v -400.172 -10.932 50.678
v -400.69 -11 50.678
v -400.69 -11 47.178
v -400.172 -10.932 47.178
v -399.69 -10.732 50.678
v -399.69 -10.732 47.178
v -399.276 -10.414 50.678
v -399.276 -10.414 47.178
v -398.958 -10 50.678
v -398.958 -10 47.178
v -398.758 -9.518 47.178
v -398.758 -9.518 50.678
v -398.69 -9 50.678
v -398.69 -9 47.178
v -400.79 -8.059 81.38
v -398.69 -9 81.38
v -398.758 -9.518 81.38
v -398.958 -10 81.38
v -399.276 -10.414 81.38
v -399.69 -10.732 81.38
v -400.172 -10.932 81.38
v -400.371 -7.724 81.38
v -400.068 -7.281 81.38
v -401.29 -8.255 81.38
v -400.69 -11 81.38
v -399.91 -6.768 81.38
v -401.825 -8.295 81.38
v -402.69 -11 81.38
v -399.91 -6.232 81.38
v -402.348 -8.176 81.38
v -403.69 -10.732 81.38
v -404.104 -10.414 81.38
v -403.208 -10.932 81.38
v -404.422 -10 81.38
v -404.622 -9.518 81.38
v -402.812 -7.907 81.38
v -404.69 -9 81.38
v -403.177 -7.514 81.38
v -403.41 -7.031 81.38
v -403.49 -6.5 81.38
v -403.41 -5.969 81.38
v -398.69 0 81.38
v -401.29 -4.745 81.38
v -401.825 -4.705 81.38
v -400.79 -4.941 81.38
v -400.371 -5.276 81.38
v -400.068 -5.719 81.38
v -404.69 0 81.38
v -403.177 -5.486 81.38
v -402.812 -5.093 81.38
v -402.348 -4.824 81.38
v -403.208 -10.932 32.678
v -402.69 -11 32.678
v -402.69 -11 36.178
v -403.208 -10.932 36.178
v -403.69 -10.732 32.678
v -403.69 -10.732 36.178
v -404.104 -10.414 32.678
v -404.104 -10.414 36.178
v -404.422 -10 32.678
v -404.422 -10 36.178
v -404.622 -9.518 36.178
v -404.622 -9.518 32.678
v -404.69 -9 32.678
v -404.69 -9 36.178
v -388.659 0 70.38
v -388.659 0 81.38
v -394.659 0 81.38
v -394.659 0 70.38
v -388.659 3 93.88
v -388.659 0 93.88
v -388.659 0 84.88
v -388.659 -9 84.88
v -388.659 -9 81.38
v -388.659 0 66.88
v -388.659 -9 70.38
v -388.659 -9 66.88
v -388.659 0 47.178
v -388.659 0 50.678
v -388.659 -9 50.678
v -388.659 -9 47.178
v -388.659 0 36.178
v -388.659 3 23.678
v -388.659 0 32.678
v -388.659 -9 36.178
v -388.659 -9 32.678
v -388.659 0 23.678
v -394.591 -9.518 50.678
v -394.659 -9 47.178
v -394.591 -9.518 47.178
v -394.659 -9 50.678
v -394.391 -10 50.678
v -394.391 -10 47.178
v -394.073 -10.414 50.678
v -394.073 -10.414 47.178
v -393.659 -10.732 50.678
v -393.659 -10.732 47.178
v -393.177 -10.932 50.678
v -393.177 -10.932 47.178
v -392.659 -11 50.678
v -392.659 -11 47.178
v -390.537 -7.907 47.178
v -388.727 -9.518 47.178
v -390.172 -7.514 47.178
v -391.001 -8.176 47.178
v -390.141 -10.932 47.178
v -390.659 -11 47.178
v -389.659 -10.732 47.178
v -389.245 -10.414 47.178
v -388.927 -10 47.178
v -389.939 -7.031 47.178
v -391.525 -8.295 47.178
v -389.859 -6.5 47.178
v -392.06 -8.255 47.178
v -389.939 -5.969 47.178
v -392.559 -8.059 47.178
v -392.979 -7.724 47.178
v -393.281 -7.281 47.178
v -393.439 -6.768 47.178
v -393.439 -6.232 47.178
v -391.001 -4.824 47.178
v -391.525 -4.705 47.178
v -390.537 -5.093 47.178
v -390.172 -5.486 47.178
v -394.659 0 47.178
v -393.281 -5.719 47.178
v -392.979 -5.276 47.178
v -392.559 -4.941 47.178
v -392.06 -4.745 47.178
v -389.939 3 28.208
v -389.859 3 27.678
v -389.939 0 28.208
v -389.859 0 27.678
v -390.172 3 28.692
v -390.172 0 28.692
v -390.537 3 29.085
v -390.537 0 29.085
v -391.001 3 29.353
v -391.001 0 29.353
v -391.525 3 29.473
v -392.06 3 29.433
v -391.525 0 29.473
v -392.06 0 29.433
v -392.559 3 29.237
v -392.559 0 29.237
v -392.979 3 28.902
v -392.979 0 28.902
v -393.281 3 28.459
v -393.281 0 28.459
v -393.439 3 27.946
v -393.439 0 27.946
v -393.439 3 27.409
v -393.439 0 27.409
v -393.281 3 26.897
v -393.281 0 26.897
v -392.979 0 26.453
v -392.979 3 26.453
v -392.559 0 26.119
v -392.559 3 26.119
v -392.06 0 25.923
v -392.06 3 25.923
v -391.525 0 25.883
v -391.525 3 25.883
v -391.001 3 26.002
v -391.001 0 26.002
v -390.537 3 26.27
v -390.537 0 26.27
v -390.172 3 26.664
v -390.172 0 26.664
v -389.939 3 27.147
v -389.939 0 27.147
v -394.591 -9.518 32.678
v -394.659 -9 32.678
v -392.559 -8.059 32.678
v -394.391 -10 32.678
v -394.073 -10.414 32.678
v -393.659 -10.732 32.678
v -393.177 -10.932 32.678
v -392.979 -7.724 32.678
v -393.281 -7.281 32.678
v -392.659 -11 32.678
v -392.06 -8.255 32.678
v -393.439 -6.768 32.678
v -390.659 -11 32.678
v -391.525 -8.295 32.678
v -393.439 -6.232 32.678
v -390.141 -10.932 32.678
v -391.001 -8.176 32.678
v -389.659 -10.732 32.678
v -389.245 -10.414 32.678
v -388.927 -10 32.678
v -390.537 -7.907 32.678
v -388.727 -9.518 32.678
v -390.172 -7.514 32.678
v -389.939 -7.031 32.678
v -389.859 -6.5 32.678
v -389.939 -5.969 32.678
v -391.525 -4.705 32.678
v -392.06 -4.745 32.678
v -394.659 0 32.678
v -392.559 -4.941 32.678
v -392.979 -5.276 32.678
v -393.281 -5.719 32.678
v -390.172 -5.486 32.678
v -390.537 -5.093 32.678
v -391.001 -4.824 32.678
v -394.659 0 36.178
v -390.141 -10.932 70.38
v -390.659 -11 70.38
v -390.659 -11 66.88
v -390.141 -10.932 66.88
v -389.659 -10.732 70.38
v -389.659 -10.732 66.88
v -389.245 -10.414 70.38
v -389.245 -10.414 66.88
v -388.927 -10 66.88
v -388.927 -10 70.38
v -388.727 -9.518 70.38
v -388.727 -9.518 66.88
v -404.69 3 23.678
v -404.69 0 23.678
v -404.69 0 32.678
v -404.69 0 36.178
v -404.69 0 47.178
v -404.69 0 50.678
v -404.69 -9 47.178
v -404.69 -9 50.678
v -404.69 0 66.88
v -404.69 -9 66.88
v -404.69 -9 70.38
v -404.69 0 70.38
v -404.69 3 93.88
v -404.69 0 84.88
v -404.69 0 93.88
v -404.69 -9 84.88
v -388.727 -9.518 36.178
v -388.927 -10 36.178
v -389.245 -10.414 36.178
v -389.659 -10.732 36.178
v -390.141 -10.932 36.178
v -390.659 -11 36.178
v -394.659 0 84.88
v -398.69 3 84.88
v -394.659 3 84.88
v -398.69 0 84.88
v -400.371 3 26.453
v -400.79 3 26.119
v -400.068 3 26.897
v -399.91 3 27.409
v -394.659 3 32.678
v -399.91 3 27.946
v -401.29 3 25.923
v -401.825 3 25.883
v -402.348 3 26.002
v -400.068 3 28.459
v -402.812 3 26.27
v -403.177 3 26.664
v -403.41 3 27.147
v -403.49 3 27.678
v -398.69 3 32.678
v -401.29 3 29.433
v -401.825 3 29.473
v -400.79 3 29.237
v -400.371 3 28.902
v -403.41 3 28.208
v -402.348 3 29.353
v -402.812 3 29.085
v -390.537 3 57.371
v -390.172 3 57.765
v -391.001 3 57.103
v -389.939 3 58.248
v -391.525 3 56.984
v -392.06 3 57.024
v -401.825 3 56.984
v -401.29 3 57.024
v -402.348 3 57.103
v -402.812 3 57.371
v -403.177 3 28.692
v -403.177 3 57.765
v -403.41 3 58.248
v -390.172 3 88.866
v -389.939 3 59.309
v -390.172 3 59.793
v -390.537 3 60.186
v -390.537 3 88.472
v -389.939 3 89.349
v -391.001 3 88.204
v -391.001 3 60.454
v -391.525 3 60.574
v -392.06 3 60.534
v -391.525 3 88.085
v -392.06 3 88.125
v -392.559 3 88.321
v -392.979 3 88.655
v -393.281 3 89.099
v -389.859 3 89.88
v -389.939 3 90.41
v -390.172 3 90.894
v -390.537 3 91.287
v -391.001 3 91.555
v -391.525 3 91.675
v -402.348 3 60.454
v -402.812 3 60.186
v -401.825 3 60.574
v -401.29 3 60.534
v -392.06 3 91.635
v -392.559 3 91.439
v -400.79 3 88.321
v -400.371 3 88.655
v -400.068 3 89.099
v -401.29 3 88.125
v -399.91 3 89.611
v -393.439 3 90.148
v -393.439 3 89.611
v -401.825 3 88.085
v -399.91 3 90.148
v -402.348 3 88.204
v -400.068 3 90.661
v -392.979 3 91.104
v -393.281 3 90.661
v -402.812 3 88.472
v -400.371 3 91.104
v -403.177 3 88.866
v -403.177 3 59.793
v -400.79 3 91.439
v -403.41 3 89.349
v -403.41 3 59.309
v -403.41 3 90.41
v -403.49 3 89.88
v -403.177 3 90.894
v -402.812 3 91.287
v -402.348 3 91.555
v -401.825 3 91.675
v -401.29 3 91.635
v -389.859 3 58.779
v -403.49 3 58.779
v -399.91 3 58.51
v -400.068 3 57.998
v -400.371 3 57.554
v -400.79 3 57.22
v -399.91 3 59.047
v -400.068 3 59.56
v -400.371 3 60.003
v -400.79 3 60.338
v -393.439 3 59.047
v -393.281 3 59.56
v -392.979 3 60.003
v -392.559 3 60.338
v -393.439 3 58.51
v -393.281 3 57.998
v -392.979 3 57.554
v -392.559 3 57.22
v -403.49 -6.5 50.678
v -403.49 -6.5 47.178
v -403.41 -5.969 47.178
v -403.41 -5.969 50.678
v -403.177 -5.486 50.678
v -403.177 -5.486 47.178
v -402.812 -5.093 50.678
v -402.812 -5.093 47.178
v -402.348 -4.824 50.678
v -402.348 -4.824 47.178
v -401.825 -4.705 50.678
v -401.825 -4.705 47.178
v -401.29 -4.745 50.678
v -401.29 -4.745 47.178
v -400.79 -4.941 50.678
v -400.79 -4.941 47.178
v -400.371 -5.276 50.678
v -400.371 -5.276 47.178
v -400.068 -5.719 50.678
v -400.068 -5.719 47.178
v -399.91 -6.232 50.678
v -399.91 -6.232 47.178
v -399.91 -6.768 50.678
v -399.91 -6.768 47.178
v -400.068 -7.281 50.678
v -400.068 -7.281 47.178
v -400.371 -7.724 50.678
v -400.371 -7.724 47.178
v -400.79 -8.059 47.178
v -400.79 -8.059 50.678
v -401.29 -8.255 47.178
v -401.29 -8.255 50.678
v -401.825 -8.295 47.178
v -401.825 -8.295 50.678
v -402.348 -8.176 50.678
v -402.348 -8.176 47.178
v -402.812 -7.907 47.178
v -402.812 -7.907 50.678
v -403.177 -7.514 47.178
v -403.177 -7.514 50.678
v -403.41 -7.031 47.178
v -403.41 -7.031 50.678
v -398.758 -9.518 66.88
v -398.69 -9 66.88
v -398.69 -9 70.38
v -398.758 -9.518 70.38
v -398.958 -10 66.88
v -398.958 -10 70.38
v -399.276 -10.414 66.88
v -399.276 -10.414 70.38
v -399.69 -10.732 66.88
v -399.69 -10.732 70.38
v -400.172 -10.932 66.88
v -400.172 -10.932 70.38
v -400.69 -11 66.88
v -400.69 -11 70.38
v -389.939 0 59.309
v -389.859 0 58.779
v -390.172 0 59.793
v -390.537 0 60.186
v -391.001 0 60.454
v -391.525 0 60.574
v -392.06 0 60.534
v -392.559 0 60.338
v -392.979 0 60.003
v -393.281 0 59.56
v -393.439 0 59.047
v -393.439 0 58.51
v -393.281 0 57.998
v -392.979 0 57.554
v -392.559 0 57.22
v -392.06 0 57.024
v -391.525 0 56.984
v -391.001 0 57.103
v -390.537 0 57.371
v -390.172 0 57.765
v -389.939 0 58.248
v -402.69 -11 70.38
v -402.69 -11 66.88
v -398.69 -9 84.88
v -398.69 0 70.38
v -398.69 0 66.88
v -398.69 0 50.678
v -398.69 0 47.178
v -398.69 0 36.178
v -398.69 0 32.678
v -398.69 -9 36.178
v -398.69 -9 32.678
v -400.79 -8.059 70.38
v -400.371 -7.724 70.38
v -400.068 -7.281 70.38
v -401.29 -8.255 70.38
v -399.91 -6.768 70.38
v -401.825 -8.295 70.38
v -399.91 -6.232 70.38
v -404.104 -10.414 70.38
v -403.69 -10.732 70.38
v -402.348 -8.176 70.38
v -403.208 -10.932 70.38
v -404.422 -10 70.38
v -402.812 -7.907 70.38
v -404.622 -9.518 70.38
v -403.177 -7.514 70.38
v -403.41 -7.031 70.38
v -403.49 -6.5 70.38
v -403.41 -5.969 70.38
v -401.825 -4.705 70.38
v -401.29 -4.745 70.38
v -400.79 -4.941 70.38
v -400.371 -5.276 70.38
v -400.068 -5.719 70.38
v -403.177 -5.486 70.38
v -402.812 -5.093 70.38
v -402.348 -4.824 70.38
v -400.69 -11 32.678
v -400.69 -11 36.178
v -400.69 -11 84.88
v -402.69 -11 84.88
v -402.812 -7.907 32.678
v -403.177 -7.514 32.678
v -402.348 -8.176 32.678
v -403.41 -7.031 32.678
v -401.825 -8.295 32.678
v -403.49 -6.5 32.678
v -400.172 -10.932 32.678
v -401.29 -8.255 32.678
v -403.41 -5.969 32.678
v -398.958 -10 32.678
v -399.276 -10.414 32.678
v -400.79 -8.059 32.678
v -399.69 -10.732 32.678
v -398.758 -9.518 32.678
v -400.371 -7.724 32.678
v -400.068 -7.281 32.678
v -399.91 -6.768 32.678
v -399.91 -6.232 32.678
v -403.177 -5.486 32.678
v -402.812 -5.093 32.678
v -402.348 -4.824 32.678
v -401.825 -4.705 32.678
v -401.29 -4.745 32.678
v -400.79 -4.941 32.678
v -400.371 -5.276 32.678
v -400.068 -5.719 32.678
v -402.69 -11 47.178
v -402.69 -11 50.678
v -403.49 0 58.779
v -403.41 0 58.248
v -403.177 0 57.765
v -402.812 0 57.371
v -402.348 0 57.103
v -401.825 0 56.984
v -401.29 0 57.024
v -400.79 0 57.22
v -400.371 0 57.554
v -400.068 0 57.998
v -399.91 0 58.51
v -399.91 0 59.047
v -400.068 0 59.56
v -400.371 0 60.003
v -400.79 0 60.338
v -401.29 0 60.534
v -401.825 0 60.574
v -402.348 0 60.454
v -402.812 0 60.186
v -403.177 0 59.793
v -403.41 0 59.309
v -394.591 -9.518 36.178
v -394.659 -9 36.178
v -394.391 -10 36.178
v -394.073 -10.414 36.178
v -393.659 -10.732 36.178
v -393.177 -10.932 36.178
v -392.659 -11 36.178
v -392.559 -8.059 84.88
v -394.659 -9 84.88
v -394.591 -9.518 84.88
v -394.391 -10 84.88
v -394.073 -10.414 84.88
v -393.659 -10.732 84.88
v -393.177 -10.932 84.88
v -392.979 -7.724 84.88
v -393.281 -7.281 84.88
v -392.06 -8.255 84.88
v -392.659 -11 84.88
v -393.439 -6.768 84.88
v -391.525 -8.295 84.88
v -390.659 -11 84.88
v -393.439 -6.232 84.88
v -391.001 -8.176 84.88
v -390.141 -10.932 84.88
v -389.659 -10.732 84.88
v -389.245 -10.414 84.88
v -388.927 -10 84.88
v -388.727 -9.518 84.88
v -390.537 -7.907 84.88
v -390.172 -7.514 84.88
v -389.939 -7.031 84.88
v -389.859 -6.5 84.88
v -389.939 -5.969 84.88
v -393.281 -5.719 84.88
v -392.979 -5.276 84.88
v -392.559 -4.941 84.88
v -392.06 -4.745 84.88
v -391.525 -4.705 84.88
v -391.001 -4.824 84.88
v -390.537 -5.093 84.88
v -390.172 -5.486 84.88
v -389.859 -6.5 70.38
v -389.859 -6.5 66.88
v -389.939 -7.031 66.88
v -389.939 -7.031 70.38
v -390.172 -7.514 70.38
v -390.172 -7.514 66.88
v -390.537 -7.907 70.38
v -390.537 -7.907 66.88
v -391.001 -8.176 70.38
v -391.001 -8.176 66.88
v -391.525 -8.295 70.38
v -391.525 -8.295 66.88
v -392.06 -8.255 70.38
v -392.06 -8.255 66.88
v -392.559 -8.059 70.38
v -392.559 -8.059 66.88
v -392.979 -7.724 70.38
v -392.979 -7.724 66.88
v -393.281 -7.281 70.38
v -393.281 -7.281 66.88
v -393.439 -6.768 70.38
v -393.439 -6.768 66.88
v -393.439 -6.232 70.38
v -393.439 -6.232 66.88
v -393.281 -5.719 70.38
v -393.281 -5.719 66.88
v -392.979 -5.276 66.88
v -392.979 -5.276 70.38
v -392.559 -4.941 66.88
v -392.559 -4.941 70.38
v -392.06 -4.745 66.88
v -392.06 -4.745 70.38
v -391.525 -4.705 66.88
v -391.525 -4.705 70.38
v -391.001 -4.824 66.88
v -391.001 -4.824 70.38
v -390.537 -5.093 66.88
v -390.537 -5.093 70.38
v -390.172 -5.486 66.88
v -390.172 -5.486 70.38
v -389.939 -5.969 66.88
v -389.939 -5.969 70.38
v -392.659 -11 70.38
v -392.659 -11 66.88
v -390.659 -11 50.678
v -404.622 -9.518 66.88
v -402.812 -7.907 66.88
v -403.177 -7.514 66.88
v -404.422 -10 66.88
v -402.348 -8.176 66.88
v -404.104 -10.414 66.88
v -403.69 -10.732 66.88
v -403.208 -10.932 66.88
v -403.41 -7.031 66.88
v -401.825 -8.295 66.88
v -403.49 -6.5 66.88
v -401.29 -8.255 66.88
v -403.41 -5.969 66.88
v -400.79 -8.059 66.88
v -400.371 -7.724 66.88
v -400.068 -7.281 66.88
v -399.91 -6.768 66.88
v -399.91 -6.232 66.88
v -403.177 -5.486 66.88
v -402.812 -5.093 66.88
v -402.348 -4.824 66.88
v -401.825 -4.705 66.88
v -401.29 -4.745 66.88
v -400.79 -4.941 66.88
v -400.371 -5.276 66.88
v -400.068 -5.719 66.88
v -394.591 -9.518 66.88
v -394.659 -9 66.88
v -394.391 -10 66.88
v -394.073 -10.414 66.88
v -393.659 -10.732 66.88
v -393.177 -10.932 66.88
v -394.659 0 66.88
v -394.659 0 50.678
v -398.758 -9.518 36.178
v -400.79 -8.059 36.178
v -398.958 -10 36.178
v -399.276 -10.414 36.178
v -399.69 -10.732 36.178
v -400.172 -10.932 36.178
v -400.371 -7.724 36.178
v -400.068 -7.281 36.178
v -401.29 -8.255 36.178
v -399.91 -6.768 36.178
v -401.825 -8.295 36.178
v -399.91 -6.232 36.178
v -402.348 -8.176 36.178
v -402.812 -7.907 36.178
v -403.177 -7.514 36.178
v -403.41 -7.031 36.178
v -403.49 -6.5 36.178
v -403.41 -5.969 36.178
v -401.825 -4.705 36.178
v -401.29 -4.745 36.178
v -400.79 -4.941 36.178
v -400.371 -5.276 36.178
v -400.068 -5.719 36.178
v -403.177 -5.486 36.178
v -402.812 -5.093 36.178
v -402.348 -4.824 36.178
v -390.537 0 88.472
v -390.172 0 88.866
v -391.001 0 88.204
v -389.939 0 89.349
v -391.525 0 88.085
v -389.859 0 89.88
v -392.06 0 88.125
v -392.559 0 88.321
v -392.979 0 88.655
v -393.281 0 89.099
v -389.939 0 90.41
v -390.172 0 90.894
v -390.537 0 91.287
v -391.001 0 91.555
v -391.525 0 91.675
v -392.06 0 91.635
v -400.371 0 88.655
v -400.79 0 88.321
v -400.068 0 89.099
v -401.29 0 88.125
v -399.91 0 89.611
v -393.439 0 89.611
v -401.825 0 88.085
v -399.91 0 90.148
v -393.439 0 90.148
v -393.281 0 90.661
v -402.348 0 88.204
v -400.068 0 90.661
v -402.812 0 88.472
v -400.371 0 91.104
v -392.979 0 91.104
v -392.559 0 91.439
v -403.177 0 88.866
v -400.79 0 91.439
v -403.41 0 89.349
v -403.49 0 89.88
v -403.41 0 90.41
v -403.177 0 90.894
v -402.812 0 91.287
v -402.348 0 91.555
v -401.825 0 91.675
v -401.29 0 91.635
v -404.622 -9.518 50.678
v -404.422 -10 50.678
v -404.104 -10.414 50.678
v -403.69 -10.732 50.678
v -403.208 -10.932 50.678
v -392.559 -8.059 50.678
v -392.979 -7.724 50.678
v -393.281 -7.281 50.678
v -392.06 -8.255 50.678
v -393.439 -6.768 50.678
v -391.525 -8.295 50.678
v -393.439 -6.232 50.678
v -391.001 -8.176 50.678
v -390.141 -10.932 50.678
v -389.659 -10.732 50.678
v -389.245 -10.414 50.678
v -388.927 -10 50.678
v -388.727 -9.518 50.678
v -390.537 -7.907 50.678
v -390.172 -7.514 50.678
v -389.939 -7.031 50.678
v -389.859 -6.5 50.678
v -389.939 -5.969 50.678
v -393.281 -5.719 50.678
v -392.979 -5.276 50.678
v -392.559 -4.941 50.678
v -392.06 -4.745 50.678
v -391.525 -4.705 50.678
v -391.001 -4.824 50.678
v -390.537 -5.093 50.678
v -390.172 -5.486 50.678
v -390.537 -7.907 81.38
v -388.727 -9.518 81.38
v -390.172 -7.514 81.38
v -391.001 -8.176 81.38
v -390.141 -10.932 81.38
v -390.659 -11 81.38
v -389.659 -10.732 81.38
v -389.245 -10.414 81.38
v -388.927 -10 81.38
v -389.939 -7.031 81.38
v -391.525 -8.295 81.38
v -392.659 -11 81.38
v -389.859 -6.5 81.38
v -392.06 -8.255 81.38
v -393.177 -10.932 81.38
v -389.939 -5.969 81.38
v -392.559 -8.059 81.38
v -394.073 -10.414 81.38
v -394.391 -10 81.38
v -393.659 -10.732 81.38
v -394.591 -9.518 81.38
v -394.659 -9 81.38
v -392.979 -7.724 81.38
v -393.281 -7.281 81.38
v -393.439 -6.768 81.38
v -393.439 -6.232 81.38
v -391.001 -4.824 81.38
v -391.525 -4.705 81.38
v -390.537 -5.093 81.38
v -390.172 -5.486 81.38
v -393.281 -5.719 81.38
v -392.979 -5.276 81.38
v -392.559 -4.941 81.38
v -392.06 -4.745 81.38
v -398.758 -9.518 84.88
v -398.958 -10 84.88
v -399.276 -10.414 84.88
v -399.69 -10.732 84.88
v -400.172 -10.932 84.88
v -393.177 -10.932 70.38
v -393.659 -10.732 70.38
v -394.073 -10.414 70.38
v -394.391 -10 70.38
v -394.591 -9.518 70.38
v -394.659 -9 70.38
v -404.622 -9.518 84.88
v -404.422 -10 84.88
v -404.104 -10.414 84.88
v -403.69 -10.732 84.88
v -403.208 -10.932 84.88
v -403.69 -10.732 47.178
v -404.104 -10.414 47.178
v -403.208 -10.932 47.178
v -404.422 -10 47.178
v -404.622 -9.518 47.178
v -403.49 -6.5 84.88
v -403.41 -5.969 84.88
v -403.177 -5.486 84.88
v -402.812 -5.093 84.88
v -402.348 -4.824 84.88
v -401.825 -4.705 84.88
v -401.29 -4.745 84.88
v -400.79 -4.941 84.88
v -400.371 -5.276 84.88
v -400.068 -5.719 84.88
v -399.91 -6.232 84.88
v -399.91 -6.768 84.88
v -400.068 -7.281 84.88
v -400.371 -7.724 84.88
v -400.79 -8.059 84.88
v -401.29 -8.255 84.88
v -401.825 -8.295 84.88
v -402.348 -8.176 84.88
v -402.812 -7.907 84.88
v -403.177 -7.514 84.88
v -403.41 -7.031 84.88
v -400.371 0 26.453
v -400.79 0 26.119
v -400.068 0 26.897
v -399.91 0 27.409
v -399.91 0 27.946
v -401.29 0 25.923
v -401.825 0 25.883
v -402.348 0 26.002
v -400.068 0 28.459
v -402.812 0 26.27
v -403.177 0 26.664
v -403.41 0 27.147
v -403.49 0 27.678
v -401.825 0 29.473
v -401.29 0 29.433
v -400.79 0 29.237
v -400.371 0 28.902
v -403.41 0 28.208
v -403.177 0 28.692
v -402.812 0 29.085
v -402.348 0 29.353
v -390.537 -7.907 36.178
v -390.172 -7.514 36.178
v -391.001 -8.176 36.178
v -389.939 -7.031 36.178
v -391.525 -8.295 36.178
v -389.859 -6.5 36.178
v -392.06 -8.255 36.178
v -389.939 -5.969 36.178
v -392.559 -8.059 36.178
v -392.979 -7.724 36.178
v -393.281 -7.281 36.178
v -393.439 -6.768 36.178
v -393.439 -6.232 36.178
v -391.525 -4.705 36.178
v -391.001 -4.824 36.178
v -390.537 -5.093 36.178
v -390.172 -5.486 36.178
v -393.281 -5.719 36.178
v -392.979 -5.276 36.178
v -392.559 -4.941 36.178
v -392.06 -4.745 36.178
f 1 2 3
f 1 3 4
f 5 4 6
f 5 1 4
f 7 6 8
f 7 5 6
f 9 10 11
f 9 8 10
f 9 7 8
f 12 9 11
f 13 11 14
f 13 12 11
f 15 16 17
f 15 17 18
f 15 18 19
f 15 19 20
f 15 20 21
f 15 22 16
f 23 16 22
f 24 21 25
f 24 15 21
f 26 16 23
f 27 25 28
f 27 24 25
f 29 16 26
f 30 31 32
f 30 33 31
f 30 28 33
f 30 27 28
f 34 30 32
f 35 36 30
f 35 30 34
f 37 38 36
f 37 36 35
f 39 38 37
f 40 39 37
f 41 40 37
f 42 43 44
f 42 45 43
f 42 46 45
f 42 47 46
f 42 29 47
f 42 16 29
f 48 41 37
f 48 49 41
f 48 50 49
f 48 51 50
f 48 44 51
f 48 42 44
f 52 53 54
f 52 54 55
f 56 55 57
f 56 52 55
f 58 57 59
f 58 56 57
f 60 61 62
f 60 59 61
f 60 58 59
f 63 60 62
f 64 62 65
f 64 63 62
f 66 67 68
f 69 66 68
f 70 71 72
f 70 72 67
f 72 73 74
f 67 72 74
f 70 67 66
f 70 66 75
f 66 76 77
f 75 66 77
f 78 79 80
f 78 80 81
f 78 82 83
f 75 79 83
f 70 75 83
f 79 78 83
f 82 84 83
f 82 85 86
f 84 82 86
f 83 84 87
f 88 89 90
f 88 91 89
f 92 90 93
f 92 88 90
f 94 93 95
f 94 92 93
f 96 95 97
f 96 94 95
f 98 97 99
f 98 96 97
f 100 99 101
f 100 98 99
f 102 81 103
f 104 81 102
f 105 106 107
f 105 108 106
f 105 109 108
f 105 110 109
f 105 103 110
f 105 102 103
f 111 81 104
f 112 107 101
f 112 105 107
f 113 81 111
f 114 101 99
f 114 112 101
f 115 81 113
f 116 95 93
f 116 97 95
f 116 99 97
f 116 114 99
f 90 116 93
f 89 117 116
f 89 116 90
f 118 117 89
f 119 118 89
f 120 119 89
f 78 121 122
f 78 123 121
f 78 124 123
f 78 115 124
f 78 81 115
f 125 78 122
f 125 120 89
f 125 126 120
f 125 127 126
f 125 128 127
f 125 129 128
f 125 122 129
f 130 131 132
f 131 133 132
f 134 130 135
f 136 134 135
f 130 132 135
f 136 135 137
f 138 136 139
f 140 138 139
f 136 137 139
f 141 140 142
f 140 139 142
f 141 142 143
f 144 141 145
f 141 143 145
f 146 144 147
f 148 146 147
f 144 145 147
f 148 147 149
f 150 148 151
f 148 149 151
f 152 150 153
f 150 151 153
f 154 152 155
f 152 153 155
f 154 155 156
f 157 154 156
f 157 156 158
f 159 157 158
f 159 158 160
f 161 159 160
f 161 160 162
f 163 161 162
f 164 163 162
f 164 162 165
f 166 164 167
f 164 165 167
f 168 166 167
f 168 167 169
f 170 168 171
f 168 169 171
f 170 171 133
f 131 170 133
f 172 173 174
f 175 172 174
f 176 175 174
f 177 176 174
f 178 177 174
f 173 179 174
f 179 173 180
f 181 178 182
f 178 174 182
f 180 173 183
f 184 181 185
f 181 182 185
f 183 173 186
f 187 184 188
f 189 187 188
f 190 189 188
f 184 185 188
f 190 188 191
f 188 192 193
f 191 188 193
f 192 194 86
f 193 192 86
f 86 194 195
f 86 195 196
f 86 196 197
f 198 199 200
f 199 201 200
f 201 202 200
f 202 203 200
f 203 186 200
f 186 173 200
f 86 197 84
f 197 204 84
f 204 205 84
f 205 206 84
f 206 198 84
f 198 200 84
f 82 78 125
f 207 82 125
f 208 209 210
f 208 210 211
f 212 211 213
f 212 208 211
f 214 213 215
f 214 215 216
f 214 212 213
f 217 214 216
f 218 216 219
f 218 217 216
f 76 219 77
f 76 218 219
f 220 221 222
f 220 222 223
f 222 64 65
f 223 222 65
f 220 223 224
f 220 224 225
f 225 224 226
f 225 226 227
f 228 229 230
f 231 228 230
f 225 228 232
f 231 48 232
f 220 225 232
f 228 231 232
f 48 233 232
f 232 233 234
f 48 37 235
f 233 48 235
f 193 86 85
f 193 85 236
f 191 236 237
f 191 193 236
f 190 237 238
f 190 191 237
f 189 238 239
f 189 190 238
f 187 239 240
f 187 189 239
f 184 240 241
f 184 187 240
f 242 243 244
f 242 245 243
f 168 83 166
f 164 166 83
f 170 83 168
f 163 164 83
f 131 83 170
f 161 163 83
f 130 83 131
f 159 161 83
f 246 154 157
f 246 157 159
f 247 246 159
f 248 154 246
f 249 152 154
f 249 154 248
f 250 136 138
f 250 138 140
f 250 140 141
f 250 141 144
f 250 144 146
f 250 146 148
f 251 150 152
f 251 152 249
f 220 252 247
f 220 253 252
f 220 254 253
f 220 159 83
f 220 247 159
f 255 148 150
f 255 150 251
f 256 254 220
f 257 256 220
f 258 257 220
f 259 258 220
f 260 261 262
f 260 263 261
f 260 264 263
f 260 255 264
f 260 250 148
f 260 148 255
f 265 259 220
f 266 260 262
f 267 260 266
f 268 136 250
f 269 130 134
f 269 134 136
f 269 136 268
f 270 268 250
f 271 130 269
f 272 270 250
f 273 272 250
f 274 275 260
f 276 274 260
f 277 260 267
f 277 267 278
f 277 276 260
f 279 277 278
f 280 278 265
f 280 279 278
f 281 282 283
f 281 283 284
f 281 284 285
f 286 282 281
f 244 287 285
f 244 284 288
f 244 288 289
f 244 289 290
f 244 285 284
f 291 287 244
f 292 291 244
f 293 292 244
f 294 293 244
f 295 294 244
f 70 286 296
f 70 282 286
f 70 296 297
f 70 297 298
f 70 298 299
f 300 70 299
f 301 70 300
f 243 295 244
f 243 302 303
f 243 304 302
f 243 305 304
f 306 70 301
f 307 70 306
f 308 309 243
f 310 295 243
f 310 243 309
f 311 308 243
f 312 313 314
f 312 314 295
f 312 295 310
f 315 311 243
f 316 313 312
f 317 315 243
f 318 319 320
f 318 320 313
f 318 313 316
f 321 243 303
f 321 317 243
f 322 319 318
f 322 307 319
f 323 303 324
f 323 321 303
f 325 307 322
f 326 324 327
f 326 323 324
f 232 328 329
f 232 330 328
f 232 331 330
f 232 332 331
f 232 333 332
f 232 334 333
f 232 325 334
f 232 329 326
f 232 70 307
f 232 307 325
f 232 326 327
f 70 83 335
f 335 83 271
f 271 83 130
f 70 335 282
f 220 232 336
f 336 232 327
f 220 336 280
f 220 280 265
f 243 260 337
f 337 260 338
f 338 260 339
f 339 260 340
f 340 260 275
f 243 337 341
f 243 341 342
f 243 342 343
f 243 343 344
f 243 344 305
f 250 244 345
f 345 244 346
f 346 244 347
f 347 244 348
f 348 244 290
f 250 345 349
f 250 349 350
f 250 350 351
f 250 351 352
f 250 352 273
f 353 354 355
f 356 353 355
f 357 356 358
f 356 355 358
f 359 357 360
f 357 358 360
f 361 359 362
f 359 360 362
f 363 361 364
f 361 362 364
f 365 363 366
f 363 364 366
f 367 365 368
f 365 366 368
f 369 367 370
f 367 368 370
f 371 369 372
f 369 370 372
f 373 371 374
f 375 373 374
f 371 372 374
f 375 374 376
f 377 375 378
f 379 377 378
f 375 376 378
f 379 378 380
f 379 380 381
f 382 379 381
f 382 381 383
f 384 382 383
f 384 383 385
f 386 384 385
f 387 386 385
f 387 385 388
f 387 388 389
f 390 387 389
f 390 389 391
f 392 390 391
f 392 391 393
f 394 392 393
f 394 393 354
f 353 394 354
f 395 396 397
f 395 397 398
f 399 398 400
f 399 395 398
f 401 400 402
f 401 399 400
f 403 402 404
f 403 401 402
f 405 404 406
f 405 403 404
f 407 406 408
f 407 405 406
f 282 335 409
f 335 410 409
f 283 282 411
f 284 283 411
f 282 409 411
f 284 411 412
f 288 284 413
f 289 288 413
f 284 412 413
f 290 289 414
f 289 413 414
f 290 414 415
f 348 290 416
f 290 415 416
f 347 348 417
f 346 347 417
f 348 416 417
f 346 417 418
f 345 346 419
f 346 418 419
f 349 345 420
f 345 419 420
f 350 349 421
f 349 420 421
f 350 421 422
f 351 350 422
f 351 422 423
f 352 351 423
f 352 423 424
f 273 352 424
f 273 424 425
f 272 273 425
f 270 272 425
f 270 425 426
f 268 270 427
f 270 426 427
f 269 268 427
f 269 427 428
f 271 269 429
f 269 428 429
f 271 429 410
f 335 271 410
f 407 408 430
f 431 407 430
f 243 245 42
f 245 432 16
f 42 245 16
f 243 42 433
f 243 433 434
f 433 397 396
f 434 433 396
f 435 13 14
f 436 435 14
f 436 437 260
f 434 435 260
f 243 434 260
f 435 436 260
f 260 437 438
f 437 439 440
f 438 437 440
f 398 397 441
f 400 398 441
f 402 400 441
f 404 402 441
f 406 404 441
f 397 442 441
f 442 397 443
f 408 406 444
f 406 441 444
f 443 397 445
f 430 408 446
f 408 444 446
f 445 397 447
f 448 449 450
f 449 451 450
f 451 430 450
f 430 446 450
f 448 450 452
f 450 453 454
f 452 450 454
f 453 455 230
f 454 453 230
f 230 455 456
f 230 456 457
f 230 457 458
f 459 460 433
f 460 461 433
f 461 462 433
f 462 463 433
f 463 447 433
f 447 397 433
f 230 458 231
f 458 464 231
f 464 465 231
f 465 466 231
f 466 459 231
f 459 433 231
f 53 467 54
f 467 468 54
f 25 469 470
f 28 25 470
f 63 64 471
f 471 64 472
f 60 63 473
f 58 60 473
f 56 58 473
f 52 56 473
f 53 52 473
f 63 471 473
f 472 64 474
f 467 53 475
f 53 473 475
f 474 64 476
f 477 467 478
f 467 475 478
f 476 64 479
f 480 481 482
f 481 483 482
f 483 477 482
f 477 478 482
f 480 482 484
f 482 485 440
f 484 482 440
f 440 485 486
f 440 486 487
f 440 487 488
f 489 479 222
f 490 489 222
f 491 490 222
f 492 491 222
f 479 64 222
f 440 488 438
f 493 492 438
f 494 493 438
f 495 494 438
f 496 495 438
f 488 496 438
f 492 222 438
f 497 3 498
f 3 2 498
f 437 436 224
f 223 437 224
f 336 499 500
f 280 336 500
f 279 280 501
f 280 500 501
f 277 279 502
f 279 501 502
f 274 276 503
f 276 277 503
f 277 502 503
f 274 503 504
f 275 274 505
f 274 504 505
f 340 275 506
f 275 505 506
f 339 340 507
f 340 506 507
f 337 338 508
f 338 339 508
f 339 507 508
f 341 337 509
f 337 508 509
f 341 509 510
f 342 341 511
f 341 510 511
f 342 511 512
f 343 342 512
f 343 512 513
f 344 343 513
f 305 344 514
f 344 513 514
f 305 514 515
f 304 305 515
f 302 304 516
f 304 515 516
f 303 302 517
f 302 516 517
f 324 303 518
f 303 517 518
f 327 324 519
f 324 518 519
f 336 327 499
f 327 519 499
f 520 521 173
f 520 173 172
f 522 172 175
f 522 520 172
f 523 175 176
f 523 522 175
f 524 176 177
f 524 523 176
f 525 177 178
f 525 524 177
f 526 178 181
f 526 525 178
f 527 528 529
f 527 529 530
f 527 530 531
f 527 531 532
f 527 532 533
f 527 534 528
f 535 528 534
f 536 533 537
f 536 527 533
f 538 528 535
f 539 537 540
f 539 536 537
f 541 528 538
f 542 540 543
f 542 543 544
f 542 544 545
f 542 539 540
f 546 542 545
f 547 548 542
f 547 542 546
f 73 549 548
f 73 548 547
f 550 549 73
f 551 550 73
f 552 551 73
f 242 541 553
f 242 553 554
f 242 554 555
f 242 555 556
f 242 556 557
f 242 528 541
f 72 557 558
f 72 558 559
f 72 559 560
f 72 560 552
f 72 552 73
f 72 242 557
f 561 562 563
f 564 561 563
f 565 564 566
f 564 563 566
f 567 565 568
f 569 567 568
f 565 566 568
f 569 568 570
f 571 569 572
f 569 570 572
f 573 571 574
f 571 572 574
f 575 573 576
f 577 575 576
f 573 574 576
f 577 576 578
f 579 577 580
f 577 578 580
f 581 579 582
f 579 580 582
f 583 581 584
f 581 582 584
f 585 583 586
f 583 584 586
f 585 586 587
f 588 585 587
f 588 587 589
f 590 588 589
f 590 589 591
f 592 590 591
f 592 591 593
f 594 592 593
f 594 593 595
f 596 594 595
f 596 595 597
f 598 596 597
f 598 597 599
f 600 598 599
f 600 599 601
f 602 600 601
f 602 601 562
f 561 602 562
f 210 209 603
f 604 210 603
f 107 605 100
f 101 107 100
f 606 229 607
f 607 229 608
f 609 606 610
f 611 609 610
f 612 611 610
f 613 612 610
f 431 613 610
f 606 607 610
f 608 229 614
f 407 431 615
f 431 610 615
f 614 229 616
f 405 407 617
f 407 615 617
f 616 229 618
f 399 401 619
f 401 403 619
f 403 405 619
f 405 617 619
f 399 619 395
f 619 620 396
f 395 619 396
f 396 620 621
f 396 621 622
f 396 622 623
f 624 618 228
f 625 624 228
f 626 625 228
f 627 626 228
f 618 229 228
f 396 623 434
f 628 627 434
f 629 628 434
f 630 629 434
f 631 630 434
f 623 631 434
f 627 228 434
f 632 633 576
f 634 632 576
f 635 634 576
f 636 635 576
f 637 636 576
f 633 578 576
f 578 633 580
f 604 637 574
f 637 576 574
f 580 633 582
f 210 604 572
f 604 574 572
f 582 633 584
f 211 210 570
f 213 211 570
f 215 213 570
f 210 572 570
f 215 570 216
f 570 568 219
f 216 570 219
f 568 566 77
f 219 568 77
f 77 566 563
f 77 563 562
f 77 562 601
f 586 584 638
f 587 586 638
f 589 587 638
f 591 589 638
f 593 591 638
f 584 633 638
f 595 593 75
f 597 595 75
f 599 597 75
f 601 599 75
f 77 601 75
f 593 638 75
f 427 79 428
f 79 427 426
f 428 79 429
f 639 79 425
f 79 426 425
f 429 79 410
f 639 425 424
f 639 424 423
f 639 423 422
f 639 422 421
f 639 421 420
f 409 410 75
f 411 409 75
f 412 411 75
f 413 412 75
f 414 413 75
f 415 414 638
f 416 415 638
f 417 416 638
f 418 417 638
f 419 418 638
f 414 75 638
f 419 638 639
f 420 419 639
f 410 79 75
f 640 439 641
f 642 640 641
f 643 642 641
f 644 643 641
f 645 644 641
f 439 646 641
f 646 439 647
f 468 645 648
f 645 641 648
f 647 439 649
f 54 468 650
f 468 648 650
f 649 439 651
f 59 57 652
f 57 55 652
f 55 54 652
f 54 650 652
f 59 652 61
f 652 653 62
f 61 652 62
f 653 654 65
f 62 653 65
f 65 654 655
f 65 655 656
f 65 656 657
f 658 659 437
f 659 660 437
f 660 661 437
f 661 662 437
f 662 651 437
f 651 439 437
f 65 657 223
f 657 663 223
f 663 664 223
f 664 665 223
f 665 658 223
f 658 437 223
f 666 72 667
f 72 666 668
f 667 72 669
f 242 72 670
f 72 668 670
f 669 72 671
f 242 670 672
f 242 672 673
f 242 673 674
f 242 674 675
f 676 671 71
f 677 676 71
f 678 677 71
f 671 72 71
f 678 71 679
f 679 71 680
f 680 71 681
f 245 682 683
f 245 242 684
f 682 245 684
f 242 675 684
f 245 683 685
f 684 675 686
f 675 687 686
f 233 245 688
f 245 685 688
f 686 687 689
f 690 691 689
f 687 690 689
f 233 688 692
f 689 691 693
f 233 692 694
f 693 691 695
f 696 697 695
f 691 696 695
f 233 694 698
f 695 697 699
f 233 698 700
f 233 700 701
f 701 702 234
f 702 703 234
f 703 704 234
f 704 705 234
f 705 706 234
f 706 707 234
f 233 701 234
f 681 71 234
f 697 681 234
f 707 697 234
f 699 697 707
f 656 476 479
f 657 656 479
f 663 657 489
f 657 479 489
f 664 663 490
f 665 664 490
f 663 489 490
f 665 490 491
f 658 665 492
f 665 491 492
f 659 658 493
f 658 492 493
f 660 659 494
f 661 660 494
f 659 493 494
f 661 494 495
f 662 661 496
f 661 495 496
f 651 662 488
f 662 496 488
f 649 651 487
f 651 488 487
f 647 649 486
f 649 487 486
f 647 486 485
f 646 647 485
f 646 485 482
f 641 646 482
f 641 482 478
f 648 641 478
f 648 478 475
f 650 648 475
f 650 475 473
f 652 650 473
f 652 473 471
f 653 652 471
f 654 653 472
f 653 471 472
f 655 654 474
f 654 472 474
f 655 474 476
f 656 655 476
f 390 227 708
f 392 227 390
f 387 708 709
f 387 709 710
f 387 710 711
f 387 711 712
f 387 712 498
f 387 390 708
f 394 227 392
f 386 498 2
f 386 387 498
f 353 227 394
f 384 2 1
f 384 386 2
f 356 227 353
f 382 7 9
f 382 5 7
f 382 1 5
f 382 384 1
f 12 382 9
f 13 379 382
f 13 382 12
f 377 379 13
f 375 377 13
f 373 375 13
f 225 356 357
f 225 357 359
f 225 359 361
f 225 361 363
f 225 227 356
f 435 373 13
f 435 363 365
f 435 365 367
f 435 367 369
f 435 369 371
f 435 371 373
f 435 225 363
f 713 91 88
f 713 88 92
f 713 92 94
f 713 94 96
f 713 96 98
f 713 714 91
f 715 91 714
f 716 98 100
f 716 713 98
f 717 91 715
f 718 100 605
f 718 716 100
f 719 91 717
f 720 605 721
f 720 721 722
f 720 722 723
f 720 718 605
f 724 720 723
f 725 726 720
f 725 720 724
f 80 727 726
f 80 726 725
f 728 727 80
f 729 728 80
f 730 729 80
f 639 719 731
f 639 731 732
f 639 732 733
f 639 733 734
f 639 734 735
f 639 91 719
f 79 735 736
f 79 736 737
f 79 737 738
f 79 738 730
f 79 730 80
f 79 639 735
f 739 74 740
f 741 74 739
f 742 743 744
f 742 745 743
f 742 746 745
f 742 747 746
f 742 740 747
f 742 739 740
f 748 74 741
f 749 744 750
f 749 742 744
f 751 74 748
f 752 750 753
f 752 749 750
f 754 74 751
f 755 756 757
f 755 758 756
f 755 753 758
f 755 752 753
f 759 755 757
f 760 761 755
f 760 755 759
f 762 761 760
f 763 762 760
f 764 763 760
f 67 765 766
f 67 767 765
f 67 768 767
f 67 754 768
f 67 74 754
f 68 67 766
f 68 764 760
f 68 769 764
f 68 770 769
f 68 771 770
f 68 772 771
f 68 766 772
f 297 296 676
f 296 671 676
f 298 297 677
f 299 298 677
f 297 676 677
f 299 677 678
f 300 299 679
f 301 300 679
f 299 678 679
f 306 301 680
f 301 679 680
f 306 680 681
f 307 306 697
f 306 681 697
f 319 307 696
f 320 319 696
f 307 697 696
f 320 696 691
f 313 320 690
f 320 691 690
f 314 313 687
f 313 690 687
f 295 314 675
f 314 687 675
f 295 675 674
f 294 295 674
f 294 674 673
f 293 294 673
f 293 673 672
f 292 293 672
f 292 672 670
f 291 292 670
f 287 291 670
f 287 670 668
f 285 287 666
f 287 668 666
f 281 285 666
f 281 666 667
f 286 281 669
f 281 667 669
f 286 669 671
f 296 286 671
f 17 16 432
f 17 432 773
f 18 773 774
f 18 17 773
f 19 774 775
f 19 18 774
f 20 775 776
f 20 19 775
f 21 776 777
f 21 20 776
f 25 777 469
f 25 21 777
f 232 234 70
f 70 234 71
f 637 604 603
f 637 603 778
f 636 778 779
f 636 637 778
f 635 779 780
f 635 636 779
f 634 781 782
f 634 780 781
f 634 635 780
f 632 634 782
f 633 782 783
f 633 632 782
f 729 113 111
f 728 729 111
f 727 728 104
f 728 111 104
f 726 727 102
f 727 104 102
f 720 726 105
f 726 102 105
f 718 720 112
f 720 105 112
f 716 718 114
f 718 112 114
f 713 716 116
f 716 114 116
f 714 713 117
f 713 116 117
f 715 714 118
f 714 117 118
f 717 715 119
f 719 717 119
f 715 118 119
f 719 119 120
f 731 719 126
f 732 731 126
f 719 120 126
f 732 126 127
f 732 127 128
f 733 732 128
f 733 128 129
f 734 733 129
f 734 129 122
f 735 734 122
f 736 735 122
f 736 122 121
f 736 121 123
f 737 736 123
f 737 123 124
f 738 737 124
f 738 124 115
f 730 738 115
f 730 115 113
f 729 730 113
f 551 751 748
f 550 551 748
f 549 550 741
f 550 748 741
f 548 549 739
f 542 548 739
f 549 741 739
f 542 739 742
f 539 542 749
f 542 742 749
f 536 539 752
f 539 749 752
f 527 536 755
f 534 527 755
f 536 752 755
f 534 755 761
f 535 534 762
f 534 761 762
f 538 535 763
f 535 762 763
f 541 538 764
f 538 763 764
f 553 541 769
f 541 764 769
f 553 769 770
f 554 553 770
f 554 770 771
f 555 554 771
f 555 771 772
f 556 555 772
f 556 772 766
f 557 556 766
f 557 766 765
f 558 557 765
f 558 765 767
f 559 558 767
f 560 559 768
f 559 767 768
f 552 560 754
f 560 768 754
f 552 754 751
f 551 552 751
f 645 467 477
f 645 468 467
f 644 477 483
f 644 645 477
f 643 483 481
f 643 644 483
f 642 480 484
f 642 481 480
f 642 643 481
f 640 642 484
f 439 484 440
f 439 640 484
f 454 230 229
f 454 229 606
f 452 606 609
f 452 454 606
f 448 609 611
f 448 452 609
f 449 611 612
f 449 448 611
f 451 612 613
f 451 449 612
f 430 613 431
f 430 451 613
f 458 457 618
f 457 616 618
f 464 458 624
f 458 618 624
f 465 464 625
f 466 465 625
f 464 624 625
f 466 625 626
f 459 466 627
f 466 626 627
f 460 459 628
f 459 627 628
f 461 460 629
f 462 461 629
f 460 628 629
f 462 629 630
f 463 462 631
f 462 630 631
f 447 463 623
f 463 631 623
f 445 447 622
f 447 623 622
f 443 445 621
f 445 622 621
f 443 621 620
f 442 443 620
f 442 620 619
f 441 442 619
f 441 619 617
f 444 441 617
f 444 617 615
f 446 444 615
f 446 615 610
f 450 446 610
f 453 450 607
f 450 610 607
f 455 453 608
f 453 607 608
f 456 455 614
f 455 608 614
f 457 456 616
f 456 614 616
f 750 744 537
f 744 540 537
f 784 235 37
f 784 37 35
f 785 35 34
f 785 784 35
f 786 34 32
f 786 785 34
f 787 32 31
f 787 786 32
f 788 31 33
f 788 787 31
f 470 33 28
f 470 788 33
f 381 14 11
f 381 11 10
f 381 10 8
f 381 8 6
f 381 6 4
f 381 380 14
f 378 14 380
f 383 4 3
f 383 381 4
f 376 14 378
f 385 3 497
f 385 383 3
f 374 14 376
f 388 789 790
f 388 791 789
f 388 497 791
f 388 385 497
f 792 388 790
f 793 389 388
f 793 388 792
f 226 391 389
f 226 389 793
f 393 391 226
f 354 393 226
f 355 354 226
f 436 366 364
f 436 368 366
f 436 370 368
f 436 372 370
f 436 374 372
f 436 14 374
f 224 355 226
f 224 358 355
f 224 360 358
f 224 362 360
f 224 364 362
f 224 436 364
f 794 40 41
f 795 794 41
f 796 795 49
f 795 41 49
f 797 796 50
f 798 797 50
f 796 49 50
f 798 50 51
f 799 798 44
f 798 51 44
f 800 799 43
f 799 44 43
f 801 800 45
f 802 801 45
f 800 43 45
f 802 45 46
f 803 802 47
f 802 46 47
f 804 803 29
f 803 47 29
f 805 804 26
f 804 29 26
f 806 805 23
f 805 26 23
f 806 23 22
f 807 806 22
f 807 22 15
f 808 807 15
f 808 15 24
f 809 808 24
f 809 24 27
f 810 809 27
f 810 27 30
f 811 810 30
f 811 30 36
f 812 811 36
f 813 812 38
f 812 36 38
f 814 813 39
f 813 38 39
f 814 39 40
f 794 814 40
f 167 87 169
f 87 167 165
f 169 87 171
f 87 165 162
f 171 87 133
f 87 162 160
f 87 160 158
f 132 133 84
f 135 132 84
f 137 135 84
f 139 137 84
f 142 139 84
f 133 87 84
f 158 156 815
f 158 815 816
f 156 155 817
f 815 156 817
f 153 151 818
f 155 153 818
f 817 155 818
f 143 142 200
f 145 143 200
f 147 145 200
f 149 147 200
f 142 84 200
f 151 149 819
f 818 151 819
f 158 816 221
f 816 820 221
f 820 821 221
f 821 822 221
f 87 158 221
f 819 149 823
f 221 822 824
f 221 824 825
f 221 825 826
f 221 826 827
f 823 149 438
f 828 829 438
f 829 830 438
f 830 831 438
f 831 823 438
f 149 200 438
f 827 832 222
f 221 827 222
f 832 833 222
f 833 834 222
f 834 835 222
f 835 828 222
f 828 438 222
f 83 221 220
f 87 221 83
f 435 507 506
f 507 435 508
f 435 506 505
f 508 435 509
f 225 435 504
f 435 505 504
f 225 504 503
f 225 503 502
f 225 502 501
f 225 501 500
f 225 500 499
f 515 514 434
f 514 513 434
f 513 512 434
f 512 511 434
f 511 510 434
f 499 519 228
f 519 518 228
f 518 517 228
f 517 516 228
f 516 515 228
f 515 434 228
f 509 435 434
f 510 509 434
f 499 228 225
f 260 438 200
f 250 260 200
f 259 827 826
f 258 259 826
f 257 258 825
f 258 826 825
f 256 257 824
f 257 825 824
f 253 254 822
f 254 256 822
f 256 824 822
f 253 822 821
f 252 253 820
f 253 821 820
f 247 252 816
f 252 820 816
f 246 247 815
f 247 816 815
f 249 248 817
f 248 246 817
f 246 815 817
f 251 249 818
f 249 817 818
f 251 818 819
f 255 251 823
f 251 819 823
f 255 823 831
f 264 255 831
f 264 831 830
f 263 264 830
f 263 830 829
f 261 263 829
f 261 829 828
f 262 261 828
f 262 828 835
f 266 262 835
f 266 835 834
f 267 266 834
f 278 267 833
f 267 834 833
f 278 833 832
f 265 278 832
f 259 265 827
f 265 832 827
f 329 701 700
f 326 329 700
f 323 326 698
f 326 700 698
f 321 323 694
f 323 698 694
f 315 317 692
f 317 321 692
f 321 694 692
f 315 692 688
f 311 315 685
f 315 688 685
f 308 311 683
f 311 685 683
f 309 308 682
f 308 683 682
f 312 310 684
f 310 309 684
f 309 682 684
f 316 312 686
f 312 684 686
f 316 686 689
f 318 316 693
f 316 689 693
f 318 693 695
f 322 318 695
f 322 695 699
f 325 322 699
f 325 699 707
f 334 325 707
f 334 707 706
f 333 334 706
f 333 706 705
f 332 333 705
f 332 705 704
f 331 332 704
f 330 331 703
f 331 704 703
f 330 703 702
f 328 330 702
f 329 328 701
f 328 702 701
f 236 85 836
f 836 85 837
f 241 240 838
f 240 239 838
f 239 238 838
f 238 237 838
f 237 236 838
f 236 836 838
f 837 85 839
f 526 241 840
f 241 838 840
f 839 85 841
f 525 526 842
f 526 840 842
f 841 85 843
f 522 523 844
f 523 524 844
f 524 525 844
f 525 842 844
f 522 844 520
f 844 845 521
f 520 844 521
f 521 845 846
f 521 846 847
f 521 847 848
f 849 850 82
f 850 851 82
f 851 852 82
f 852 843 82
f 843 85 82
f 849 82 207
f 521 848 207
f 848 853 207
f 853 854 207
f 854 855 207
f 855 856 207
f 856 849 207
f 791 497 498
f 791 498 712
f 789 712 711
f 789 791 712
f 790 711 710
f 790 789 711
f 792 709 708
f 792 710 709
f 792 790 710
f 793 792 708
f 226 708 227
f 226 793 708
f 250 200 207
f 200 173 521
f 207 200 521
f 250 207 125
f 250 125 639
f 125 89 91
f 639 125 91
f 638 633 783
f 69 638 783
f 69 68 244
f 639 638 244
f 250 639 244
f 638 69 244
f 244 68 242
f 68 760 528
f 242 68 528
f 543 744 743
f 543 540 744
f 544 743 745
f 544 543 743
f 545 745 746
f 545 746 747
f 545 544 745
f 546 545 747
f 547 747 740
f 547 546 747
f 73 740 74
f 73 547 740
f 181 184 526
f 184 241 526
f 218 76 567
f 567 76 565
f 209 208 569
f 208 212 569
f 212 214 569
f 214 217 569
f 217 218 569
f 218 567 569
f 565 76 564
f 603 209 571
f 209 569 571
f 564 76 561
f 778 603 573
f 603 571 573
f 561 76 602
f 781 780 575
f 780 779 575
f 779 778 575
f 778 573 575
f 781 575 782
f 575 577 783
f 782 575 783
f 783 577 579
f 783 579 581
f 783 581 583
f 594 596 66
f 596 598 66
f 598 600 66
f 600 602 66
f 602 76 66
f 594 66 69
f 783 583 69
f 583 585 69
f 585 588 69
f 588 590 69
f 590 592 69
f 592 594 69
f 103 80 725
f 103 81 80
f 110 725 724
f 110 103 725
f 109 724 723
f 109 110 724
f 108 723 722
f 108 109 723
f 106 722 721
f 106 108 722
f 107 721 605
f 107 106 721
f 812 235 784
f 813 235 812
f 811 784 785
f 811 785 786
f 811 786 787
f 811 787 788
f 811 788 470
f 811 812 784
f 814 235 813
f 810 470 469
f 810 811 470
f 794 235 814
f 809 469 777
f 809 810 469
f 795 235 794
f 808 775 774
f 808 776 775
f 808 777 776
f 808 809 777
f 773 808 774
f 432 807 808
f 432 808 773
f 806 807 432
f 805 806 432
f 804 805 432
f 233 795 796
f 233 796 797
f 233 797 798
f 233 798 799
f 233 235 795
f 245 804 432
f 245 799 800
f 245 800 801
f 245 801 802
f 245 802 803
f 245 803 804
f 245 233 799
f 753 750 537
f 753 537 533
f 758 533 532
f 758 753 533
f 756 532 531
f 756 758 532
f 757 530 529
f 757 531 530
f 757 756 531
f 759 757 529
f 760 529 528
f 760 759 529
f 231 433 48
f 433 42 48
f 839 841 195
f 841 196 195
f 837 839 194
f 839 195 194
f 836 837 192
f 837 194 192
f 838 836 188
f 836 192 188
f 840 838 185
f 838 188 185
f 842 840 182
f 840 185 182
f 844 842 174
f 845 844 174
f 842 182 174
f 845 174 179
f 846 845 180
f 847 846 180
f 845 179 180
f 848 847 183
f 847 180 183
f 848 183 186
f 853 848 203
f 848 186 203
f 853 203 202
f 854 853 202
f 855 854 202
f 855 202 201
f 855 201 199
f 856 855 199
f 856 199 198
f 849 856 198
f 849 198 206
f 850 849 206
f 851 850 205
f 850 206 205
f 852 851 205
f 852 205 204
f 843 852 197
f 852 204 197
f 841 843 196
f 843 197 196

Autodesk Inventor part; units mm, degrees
ref_plane "YZ Plane" through (0, 0, 0) normal (1, 0, 0) x (0, 1, 0)
ref_plane "XZ Plane" through (0, 0, 0) normal (0, 1, 0) x (-1, 0, 0)
sketch "草圖1" plane through (0, 0, 0) normal (0, 1, 0) x (-1, 0, 0)
  line L0 (403.4401, 81.3797) -> (399.9401, 81.3797) construction
  line L1 (399.9401, 81.3797) -> (399.9401, 70.3797) construction
  line L2 (399.9401, 70.3797) -> (403.4401, 70.3797) construction
  line L3 (403.4401, 70.3797) -> (403.4401, 81.3797) construction
  line L4 (403.4401, 81.3797) -> (399.9401, 70.3797) construction
  line L5 (399.9401, 81.3797) -> (403.4401, 70.3797) construction
  line L6 (403.4401, 70.3797) -> (404.6901, 70.3797)
  line L7 (398.6901, 70.3797) -> (403.4401, 70.3797)
  line L8 (403.4401, 81.3797) -> (404.6901, 81.3797)
  line L9 (404.6901, 84.8797) -> (398.6901, 84.8797)
  line L10 (398.6901, 81.3797) -> (403.4401, 81.3797)
  line L11 (404.6901, 93.8797) -> (398.6901, 93.8797)
  line L12 (398.6901, 93.8797) -> (398.6901, 57.8797)
  line L13 (404.6901, 57.8797) -> (404.6901, 93.8797)
  line L14 (404.6901, 93.8797) -> (398.6901, 57.8797) construction
  line L15 (398.6901, 93.8797) -> (404.6901, 57.8797) construction
  line L16 (401.6901, 84.8797) -> (401.6901, 89.8797) construction
  circle A0 centre (401.6901, 89.8797) radius 1.8
  line L17 (401.6901, 75.8797) -> (401.6901, 41.6777) construction
  circle A1 centre (401.6901, 58.7787) radius 1.8
  line L18 (404.6901, 66.8797) -> (398.6901, 66.8797)
  line L19 (403.4401, 36.1777) -> (399.9401, 36.1777) construction
  line L20 (399.9401, 36.1777) -> (399.9401, 47.1777) construction
  line L21 (399.9401, 47.1777) -> (403.4401, 47.1777) construction
  line L22 (403.4401, 47.1777) -> (403.4401, 36.1777) construction
  line L23 (403.4401, 36.1777) -> (399.9401, 47.1777) construction
  line L24 (399.9401, 36.1777) -> (403.4401, 47.1777) construction
  line L25 (403.4401, 47.1777) -> (404.6901, 47.1777)
  line L26 (398.6901, 47.1777) -> (403.4401, 47.1777)
  line L27 (403.4401, 36.1777) -> (404.6901, 36.1777)
  line L28 (404.6901, 32.6777) -> (398.6901, 32.6777)
  line L29 (398.6901, 36.1777) -> (403.4401, 36.1777)
  line L30 (404.6901, 23.6777) -> (398.6901, 23.6777)
  line L31 (398.6901, 23.6777) -> (398.6901, 59.6777)
  line L32 (404.6901, 59.6777) -> (404.6901, 23.6777)
  line L33 (404.6901, 23.6777) -> (398.6901, 59.6777) construction
  line L34 (398.6901, 23.6777) -> (404.6901, 59.6777) construction
  line L35 (401.6901, 32.6777) -> (401.6901, 27.6777) construction
  circle A2 centre (401.6901, 27.6777) radius 1.8
  circle A3 centre (401.6901, 58.7787) radius 1.8
  line L36 (404.6901, 50.6777) -> (398.6901, 50.6777)
  line L37 (404.6901, 66.8797) -> (398.6901, 66.8797)
  line L38 (398.6901, 66.8797) -> (398.6901, 50.6777)
  line L39 (398.6901, 50.6777) -> (404.6901, 50.6777)
  line L40 (404.6901, 50.6777) -> (404.6901, 66.8797)
  line L41 (401.6901, 58.7787) -> (391.6591, 58.7787) construction
  line L42 (396.6746, 58.7787) -> (396.6746, 63.5433) construction
  line L43 (391.6591, 58.7787) -> (401.6901, 58.7787) construction
  line L44 (398.6901, 66.8797) -> (394.6591, 66.8797)
  line L45 (398.6901, 50.6777) -> (394.6591, 50.6777)
  point P0 (0, 0)
  point P1 (398.1901, 70.3797)
  point P2 (398.1901, 81.3797)
  point P3 (398.1901, 47.1777)
  point P4 (398.1901, 36.1777)
  dimension "d8" = 11
  dimension "d34" = 36
  dimension "d35" = 5
  dimension "d37" = 3.6
  dimension "d49" = 34.202
  dimension "d50" = 3.6
  dimension "d61" = 10.031
extrude "擠出8" add sketch "草圖1" along normal blind 3
extrude "擠出9" add sketch "草圖1" against normal blind 11 contours L6 L13 L18 L12 L7 | L8 L10 L12 L9 L13 | L32 L25 L26 L31 L36 | L32 L28 L31 L29 L27
fillet "圓角4" radius 2 8 edges at (-404.6901, -11, 34.4277) (-398.6901, -11, 34.4277) (-404.6901, -11, 48.9277) (-398.6901, -11, 48.9277) (-404.6901, -11, 68.6297) (-398.6901, -11, 68.6297) (-398.6901, -11, 83.1297) (-404.6901, -11, 83.1297)
sketch "草圖4" plane through (-398.6901, 0, 32.6777) normal (0, 0, -1) x (-1, 0, 0)
  line L0 (0, 0) -> (6, 0) construction
  line L1 (6, 0) -> (3, 0) construction
  line L2 (3, 0) -> (3, -6.5) construction
  circle A0 centre (3, -6.5) radius 1.8
  point P0 (-398.6901, 0)
  dimension "d57" = 6.5
  dimension "d58" = 3.6
extrude "擠出10" cut sketch "草圖4" against normal through all
ref_plane "工作平面4" through (-396.6746, 0, 58.7787) normal (1, 0, 0) x (0, 0, -1)
mirror "鏡射2" about plane through (-396.6746, 0, 58.7787) normal (1, 0, 0) of "擠出8", "擠出9", "擠出10", "圓角4"
sketch "草圖8" plane through (0, 0, 0) normal (0, 1, 0) x (-1, 0, 0)
  line L0 (398.6901, 32.6777) -> (398.6901, 23.6777) projected
  line L1 (394.6591, 32.6777) -> (394.6591, 23.6777) projected
  line L2 (398.6901, 93.8797) -> (398.6901, 84.8797) projected
  line L3 (394.6591, 93.8797) -> (394.6591, 84.8797) projected
  line L4 (404.6901, 93.8797) -> (398.6901, 93.8797) projected
  line L5 (388.6591, 93.8797) -> (394.6591, 93.8797) projected
  line L6 (398.6901, 93.8797) -> (394.6591, 93.8797)
  line L7 (398.6901, 84.8797) -> (394.6591, 84.8797)
  line L8 (398.6901, 32.6777) -> (394.6591, 32.6777)
  line L9 (398.6901, 23.6777) -> (394.6591, 23.6777)
  point P0 (0, 0)
extrude "擠出13" add sketch "草圖8" along normal blind 3
properties part number "a臂鎖"
